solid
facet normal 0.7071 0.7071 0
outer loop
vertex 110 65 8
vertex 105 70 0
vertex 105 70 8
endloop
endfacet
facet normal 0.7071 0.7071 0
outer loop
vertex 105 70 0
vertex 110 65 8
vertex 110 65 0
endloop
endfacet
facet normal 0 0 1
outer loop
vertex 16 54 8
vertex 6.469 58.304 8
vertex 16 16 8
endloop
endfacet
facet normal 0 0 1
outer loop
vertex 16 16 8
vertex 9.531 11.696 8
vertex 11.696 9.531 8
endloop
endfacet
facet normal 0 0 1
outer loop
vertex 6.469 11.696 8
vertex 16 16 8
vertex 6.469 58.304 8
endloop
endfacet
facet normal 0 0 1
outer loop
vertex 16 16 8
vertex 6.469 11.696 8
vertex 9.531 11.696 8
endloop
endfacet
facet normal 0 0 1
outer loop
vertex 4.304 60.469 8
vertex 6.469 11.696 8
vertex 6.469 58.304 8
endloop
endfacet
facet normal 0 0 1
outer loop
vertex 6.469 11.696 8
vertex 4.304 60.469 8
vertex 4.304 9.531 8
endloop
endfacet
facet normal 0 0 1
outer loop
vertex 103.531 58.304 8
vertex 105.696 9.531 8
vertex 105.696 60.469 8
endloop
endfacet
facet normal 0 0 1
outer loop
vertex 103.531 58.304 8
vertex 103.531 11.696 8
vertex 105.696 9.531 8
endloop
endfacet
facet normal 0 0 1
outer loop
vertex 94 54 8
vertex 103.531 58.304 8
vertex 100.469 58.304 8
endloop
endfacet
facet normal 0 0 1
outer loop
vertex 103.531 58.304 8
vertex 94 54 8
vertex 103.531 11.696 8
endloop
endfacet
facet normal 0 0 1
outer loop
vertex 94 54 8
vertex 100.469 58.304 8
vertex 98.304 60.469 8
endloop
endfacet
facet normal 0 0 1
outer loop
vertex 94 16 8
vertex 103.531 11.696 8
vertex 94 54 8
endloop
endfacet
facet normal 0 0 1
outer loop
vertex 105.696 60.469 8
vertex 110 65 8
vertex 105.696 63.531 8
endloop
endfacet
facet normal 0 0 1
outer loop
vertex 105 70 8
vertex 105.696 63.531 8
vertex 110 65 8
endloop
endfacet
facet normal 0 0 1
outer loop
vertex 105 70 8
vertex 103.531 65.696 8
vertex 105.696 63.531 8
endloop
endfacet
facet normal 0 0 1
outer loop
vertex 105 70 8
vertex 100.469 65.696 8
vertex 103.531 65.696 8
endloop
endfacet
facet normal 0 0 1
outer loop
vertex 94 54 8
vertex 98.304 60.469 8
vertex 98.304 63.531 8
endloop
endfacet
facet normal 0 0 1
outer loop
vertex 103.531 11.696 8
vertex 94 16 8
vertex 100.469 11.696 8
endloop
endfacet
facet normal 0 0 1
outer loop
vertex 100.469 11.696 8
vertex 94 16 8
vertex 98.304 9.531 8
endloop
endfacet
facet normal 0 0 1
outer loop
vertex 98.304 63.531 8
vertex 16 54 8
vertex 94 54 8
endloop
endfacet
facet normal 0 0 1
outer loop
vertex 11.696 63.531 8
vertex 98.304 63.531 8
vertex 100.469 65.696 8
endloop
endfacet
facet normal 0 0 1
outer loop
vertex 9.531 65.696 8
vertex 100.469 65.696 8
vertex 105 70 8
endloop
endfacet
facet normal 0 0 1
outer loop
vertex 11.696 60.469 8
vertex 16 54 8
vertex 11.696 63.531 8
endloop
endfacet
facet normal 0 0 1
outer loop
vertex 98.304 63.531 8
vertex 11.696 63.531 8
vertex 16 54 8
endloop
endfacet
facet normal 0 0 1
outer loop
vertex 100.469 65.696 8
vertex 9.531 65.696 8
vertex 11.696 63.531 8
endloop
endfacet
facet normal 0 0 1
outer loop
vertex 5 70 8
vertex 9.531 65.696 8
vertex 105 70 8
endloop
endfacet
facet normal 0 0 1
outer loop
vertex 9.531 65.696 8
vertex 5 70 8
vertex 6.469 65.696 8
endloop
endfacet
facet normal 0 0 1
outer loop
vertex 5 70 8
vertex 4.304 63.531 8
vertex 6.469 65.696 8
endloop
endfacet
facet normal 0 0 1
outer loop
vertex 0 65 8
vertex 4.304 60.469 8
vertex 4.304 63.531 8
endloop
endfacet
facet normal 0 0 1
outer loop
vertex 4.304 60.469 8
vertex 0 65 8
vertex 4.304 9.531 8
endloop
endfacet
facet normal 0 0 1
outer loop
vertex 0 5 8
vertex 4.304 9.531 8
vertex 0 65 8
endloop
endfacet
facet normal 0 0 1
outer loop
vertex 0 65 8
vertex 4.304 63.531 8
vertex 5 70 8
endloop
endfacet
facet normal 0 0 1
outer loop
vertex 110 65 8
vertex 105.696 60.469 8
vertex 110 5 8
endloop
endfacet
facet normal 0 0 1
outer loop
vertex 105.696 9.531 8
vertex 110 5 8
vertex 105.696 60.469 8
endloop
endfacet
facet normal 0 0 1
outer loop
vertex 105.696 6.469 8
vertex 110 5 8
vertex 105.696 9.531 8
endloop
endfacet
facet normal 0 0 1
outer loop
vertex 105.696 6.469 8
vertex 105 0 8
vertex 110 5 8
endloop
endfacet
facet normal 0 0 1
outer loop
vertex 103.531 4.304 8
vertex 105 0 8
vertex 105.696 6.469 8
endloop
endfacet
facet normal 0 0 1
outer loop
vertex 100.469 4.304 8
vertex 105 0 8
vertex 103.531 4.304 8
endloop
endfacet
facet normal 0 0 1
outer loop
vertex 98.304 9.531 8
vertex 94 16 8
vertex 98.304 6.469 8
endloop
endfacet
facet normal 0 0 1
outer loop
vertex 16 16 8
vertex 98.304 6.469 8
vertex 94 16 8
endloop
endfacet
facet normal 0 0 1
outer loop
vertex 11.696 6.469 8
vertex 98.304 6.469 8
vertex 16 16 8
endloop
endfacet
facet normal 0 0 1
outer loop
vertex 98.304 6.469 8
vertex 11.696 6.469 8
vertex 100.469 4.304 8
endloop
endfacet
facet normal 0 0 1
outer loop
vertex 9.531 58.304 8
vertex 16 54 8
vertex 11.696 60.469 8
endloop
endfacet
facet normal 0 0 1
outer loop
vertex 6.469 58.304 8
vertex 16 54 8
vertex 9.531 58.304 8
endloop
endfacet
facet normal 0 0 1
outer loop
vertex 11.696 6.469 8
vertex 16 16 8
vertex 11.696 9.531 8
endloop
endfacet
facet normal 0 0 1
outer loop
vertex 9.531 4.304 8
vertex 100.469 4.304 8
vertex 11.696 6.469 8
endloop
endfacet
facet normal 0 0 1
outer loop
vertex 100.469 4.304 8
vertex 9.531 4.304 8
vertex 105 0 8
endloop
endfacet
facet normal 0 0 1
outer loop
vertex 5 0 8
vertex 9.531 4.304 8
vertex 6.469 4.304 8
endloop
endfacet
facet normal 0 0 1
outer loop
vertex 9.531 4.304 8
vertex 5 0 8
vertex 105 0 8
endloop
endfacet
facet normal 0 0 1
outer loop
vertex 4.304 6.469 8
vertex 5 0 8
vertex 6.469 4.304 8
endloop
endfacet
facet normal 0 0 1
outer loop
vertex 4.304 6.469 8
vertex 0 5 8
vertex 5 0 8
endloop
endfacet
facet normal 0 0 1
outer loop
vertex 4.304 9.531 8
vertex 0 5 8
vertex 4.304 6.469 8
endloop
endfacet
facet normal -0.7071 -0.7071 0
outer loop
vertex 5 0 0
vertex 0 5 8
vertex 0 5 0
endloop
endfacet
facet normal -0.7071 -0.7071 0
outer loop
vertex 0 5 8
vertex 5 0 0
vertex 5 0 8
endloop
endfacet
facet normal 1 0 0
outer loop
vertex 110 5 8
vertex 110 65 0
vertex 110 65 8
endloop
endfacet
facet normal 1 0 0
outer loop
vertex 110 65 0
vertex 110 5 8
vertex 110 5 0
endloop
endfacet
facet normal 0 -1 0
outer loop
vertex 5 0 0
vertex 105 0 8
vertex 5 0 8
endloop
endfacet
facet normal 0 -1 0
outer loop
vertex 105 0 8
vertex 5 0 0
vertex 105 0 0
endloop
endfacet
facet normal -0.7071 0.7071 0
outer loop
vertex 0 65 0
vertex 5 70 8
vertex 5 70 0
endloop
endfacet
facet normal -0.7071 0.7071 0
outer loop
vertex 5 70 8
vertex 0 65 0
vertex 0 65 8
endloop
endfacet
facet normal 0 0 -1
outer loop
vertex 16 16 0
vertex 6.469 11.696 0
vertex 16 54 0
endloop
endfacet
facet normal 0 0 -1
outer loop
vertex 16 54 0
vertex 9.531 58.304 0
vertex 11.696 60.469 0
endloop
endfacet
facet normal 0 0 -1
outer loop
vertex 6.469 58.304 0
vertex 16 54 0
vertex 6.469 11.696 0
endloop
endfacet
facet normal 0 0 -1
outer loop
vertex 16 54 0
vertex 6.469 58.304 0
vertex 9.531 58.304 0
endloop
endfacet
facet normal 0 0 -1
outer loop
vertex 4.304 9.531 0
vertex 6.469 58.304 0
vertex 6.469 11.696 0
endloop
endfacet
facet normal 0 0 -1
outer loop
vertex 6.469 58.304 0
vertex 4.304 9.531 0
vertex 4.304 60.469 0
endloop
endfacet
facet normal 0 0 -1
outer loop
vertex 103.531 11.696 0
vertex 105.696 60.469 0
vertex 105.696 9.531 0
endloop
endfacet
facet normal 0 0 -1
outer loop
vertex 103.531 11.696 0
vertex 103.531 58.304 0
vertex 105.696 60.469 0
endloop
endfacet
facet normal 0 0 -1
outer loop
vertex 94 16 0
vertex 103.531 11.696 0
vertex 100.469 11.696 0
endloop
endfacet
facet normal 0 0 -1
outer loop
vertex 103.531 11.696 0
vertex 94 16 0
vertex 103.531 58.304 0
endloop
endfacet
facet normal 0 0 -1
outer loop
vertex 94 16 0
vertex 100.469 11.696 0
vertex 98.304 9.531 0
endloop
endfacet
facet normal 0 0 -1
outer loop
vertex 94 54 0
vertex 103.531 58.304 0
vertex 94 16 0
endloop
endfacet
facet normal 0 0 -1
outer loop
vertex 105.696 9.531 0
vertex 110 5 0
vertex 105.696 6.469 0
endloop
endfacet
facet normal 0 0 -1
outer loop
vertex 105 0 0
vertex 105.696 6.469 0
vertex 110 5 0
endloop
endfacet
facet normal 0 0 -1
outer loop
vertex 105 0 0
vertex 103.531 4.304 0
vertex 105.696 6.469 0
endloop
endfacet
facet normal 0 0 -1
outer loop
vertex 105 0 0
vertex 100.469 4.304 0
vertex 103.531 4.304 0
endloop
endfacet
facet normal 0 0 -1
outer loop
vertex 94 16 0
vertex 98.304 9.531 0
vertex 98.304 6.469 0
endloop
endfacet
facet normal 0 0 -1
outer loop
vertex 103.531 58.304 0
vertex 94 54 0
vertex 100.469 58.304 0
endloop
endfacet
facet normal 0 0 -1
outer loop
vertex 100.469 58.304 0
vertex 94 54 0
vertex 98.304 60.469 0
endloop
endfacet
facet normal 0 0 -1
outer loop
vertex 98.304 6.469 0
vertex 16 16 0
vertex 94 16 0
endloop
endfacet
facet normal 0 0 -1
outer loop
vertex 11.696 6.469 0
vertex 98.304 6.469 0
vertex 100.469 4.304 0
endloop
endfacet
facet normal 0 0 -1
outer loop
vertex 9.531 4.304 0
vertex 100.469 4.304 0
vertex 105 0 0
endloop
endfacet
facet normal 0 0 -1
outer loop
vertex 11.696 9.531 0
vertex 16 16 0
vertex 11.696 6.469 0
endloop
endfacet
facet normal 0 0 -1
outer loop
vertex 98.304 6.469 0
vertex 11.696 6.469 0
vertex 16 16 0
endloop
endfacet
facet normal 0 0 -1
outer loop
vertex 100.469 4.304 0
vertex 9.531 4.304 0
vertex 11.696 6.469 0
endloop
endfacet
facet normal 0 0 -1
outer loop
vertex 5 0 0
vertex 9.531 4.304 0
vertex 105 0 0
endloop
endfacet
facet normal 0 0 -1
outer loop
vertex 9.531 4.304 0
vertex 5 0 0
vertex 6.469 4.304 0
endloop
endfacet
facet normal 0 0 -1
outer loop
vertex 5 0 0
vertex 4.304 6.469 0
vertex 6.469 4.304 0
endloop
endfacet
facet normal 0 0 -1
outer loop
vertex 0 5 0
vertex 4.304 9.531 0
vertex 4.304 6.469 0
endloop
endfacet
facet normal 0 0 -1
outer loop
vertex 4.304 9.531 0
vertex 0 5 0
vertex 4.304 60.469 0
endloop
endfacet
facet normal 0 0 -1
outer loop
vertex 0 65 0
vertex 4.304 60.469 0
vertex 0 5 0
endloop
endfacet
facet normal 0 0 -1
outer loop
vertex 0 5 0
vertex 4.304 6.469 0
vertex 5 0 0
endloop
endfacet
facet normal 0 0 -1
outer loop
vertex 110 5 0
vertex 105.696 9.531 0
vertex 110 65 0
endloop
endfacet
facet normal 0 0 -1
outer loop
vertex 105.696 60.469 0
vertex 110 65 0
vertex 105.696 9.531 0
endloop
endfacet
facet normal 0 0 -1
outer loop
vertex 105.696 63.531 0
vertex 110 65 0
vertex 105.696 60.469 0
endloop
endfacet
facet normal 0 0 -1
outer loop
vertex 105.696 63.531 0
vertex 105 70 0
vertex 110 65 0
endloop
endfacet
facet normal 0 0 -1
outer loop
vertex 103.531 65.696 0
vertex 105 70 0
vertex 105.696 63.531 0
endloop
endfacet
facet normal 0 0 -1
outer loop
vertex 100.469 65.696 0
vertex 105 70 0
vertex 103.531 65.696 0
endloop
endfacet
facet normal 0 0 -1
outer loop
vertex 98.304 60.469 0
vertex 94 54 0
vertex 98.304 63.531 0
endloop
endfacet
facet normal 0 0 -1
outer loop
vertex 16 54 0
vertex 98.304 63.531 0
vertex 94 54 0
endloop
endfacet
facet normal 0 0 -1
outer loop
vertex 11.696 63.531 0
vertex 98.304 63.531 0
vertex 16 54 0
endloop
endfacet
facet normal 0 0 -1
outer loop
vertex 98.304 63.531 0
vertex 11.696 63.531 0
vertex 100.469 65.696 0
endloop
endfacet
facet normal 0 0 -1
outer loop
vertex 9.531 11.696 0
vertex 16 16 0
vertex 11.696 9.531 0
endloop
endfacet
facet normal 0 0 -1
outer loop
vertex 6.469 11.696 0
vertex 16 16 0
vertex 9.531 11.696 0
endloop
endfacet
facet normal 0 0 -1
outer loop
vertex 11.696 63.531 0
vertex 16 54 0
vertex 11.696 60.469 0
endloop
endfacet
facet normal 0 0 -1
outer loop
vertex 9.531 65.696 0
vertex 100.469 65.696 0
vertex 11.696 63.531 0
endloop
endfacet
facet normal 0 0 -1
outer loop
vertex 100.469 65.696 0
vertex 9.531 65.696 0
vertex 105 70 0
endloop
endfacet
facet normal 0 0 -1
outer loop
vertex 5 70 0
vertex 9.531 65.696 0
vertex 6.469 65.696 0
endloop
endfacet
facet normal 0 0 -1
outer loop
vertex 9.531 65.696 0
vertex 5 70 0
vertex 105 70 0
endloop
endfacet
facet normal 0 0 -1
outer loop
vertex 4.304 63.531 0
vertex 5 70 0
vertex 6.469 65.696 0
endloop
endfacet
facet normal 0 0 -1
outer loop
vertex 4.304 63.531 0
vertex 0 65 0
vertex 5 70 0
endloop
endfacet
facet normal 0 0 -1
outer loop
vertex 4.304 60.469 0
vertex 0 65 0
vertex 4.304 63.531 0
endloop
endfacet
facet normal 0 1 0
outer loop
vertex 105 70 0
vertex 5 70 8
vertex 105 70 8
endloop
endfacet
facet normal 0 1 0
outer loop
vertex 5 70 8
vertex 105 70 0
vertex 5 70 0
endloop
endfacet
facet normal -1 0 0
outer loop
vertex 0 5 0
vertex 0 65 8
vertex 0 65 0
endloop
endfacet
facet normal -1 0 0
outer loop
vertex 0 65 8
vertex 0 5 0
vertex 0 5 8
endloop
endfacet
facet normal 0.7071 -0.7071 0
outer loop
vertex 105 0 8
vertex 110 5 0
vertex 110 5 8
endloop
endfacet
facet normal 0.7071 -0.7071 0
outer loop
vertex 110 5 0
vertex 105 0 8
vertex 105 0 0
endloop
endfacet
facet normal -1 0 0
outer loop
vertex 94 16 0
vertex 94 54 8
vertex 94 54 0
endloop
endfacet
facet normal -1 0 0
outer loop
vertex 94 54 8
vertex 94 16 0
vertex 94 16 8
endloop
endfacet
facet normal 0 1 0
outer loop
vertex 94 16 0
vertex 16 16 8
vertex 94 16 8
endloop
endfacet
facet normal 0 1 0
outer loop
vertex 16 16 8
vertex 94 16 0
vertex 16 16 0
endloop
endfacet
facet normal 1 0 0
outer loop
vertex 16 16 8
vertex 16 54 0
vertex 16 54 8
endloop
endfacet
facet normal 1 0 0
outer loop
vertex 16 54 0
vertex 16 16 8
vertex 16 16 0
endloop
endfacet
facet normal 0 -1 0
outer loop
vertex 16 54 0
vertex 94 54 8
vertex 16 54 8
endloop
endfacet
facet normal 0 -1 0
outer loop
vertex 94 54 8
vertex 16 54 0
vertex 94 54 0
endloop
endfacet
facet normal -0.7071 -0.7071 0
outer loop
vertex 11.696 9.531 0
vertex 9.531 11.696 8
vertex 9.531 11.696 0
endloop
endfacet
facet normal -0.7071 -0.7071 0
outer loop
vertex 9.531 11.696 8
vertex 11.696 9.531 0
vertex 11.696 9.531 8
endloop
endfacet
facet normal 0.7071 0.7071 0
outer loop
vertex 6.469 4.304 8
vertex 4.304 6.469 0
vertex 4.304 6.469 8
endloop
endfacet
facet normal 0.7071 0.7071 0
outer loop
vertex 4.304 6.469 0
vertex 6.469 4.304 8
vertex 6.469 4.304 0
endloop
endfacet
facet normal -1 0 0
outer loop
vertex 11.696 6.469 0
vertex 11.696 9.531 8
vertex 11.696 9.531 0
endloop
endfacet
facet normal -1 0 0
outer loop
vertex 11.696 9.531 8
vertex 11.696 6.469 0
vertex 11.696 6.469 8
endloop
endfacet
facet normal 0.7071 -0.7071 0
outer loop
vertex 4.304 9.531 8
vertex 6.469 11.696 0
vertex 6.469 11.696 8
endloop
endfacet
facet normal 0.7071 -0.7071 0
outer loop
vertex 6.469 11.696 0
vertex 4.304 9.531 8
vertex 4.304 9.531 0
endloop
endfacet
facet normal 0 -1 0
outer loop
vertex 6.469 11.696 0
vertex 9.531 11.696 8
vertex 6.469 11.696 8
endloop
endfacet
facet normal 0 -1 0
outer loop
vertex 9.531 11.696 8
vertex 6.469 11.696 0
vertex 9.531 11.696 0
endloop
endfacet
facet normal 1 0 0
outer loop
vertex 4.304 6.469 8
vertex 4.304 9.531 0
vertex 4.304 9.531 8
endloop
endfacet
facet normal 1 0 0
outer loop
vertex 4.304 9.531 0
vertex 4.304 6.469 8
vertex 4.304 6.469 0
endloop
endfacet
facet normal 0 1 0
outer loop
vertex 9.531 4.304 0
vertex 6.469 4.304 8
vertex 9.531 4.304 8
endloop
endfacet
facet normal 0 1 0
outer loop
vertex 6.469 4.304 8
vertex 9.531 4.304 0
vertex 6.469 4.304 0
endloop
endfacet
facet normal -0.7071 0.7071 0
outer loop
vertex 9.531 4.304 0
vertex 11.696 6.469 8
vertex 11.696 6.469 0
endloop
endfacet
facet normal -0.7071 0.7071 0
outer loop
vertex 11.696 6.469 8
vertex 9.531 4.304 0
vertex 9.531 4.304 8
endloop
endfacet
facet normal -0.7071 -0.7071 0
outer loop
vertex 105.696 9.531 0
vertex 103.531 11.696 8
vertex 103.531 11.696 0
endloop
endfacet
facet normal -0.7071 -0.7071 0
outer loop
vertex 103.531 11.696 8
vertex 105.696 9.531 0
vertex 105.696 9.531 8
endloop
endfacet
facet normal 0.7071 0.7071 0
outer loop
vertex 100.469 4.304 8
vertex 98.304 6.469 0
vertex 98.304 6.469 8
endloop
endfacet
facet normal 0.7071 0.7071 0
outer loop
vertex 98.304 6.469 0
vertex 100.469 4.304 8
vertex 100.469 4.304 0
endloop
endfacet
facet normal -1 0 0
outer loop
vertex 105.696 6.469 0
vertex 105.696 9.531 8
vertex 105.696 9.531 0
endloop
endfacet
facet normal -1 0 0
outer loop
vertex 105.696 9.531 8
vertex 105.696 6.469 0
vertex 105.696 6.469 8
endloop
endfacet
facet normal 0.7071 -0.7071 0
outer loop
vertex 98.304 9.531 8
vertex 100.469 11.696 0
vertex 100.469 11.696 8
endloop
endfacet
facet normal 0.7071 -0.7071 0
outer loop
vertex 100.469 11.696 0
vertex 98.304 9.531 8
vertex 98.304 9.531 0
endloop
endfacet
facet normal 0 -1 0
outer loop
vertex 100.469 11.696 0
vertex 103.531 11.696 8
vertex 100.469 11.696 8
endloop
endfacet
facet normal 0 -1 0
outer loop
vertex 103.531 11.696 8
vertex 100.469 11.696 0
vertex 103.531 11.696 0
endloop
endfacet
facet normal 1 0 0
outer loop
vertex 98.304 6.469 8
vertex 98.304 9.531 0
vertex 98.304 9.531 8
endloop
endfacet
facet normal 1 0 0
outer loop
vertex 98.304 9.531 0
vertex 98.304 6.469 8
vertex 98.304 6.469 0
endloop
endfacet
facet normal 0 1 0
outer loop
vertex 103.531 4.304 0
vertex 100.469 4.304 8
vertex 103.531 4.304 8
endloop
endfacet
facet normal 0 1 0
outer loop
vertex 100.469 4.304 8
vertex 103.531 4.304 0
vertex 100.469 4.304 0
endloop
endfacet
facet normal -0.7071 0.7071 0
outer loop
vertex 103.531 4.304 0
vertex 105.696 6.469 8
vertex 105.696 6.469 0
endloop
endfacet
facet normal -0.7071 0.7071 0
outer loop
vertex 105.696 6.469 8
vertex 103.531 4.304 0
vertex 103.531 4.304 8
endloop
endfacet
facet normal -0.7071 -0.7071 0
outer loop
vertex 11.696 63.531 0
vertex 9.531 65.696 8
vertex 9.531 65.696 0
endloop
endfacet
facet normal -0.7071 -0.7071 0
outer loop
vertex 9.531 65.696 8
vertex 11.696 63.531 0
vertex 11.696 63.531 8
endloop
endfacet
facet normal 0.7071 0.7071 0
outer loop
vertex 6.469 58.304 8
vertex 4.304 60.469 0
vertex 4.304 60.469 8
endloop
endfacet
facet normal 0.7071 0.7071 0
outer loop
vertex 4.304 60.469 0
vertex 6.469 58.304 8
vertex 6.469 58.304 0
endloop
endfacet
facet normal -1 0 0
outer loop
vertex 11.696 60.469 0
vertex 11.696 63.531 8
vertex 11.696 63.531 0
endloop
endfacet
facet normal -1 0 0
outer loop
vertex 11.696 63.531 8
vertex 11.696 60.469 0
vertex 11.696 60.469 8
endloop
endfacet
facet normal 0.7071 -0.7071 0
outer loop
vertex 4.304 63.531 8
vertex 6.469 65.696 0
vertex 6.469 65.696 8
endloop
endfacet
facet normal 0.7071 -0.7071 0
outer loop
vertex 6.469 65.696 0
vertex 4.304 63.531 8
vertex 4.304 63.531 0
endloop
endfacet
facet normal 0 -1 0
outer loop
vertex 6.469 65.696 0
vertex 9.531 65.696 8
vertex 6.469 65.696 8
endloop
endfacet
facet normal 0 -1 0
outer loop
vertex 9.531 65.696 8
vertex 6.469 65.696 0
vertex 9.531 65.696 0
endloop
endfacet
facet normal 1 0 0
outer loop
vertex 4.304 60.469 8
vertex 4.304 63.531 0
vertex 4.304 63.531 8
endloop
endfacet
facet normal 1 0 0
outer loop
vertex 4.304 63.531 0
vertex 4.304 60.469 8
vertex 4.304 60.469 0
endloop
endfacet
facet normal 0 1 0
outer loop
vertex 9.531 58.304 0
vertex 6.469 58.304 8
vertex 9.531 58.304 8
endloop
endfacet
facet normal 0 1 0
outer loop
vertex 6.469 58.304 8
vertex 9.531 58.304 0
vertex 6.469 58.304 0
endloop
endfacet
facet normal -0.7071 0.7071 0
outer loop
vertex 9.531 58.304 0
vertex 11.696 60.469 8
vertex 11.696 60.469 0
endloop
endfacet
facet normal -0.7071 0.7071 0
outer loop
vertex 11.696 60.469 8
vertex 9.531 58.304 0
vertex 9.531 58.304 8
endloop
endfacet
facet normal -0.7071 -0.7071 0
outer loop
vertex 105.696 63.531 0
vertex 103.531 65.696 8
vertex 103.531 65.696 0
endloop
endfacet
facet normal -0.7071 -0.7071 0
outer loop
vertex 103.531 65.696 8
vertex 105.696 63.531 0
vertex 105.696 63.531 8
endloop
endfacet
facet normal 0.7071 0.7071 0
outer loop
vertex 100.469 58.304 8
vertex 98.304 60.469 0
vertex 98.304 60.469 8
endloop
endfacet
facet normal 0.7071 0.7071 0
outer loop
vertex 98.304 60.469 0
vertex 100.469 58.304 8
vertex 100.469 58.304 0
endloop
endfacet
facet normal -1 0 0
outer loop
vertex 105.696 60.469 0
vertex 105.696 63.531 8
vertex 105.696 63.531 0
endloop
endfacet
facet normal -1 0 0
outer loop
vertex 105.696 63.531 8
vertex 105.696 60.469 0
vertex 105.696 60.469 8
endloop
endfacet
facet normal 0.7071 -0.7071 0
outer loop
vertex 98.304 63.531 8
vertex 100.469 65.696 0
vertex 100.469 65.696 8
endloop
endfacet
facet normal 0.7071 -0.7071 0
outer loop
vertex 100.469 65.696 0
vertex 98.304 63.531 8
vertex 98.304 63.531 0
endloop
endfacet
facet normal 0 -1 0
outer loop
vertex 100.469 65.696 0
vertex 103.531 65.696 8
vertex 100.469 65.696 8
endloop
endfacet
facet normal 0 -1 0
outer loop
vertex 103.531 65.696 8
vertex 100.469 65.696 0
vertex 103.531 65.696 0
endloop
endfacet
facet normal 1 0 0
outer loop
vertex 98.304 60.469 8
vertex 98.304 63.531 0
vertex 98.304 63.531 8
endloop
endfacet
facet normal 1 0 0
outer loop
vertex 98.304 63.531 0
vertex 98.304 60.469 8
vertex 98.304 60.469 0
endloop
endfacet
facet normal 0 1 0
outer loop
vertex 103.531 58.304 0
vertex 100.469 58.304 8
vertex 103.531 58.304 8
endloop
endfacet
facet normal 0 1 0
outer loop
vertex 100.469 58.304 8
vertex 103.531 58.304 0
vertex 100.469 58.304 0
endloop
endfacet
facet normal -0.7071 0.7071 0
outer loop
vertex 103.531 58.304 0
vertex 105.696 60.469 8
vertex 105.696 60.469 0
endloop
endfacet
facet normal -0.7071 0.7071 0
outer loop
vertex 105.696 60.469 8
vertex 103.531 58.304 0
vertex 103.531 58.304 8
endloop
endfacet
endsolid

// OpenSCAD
$fn = 32;

// ----------------------------------------------------------------------
// Frame plate: 110 x 70 frame, 16 mm rails
// ----------------------------------------------------------------------

// --- parameters (mm) ---
plate_l = 110;            // plate length, X
plate_w = 70;             // plate width, Y
plate_t = 8;              // plate thickness, Z (extrusion height)
corner_c = 5;             // corner chamfer
frame_bar = 16;           // frame rail width
bolt_r = 4;               // corner bolt window radius
bolt_inset = 8;           // bolt centre inset from the edges

win_l = plate_l - 2 * frame_bar;  // window length
win_w = plate_w - 2 * frame_bar;  // window width
bolt_d = 2 * bolt_r;  // corner hole diameter

profile = [[5, 0], [105, 0], [110, 5], [110, 65], [105, 70], [5, 70], [0, 65], [0, 5]];  // primary outline, 8 points, counter clockwise
void_1 = [[16, 16], [94, 16], [94, 54], [16, 54]];  // the window, 4 points
void_2 = [[11.696, 9.531], [9.531, 11.696], [6.469, 11.696], [4.304, 9.531], [4.304, 6.469], [6.469, 4.304], [9.531, 4.304], [11.696, 6.469]];  // corner bolt window, 8 points
void_3 = [[105.696, 9.531], [103.531, 11.696], [100.469, 11.696], [98.304, 9.531], [98.304, 6.469], [100.469, 4.304], [103.531, 4.304], [105.696, 6.469]];  // corner bolt window, 8 points
void_4 = [[11.696, 63.531], [9.531, 65.696], [6.469, 65.696], [4.304, 63.531], [4.304, 60.469], [6.469, 58.304], [9.531, 58.304], [11.696, 60.469]];  // corner bolt window, 8 points
void_5 = [[105.696, 63.531], [103.531, 65.696], [100.469, 65.696], [98.304, 63.531], [98.304, 60.469], [100.469, 58.304], [103.531, 58.304], [105.696, 60.469]];  // corner bolt window, 8 points

// --- the one profile operation ---
difference() {
  linear_extrude(height = plate_t) polygon(points = profile);
  translate([0, 0, -1])
    linear_extrude(height = plate_t + 2) polygon(points = void_1);
  translate([0, 0, -1])
    linear_extrude(height = plate_t + 2) polygon(points = void_2);
  translate([0, 0, -1])
    linear_extrude(height = plate_t + 2) polygon(points = void_3);
  translate([0, 0, -1])
    linear_extrude(height = plate_t + 2) polygon(points = void_4);
  translate([0, 0, -1])
    linear_extrude(height = plate_t + 2) polygon(points = void_5);
}
